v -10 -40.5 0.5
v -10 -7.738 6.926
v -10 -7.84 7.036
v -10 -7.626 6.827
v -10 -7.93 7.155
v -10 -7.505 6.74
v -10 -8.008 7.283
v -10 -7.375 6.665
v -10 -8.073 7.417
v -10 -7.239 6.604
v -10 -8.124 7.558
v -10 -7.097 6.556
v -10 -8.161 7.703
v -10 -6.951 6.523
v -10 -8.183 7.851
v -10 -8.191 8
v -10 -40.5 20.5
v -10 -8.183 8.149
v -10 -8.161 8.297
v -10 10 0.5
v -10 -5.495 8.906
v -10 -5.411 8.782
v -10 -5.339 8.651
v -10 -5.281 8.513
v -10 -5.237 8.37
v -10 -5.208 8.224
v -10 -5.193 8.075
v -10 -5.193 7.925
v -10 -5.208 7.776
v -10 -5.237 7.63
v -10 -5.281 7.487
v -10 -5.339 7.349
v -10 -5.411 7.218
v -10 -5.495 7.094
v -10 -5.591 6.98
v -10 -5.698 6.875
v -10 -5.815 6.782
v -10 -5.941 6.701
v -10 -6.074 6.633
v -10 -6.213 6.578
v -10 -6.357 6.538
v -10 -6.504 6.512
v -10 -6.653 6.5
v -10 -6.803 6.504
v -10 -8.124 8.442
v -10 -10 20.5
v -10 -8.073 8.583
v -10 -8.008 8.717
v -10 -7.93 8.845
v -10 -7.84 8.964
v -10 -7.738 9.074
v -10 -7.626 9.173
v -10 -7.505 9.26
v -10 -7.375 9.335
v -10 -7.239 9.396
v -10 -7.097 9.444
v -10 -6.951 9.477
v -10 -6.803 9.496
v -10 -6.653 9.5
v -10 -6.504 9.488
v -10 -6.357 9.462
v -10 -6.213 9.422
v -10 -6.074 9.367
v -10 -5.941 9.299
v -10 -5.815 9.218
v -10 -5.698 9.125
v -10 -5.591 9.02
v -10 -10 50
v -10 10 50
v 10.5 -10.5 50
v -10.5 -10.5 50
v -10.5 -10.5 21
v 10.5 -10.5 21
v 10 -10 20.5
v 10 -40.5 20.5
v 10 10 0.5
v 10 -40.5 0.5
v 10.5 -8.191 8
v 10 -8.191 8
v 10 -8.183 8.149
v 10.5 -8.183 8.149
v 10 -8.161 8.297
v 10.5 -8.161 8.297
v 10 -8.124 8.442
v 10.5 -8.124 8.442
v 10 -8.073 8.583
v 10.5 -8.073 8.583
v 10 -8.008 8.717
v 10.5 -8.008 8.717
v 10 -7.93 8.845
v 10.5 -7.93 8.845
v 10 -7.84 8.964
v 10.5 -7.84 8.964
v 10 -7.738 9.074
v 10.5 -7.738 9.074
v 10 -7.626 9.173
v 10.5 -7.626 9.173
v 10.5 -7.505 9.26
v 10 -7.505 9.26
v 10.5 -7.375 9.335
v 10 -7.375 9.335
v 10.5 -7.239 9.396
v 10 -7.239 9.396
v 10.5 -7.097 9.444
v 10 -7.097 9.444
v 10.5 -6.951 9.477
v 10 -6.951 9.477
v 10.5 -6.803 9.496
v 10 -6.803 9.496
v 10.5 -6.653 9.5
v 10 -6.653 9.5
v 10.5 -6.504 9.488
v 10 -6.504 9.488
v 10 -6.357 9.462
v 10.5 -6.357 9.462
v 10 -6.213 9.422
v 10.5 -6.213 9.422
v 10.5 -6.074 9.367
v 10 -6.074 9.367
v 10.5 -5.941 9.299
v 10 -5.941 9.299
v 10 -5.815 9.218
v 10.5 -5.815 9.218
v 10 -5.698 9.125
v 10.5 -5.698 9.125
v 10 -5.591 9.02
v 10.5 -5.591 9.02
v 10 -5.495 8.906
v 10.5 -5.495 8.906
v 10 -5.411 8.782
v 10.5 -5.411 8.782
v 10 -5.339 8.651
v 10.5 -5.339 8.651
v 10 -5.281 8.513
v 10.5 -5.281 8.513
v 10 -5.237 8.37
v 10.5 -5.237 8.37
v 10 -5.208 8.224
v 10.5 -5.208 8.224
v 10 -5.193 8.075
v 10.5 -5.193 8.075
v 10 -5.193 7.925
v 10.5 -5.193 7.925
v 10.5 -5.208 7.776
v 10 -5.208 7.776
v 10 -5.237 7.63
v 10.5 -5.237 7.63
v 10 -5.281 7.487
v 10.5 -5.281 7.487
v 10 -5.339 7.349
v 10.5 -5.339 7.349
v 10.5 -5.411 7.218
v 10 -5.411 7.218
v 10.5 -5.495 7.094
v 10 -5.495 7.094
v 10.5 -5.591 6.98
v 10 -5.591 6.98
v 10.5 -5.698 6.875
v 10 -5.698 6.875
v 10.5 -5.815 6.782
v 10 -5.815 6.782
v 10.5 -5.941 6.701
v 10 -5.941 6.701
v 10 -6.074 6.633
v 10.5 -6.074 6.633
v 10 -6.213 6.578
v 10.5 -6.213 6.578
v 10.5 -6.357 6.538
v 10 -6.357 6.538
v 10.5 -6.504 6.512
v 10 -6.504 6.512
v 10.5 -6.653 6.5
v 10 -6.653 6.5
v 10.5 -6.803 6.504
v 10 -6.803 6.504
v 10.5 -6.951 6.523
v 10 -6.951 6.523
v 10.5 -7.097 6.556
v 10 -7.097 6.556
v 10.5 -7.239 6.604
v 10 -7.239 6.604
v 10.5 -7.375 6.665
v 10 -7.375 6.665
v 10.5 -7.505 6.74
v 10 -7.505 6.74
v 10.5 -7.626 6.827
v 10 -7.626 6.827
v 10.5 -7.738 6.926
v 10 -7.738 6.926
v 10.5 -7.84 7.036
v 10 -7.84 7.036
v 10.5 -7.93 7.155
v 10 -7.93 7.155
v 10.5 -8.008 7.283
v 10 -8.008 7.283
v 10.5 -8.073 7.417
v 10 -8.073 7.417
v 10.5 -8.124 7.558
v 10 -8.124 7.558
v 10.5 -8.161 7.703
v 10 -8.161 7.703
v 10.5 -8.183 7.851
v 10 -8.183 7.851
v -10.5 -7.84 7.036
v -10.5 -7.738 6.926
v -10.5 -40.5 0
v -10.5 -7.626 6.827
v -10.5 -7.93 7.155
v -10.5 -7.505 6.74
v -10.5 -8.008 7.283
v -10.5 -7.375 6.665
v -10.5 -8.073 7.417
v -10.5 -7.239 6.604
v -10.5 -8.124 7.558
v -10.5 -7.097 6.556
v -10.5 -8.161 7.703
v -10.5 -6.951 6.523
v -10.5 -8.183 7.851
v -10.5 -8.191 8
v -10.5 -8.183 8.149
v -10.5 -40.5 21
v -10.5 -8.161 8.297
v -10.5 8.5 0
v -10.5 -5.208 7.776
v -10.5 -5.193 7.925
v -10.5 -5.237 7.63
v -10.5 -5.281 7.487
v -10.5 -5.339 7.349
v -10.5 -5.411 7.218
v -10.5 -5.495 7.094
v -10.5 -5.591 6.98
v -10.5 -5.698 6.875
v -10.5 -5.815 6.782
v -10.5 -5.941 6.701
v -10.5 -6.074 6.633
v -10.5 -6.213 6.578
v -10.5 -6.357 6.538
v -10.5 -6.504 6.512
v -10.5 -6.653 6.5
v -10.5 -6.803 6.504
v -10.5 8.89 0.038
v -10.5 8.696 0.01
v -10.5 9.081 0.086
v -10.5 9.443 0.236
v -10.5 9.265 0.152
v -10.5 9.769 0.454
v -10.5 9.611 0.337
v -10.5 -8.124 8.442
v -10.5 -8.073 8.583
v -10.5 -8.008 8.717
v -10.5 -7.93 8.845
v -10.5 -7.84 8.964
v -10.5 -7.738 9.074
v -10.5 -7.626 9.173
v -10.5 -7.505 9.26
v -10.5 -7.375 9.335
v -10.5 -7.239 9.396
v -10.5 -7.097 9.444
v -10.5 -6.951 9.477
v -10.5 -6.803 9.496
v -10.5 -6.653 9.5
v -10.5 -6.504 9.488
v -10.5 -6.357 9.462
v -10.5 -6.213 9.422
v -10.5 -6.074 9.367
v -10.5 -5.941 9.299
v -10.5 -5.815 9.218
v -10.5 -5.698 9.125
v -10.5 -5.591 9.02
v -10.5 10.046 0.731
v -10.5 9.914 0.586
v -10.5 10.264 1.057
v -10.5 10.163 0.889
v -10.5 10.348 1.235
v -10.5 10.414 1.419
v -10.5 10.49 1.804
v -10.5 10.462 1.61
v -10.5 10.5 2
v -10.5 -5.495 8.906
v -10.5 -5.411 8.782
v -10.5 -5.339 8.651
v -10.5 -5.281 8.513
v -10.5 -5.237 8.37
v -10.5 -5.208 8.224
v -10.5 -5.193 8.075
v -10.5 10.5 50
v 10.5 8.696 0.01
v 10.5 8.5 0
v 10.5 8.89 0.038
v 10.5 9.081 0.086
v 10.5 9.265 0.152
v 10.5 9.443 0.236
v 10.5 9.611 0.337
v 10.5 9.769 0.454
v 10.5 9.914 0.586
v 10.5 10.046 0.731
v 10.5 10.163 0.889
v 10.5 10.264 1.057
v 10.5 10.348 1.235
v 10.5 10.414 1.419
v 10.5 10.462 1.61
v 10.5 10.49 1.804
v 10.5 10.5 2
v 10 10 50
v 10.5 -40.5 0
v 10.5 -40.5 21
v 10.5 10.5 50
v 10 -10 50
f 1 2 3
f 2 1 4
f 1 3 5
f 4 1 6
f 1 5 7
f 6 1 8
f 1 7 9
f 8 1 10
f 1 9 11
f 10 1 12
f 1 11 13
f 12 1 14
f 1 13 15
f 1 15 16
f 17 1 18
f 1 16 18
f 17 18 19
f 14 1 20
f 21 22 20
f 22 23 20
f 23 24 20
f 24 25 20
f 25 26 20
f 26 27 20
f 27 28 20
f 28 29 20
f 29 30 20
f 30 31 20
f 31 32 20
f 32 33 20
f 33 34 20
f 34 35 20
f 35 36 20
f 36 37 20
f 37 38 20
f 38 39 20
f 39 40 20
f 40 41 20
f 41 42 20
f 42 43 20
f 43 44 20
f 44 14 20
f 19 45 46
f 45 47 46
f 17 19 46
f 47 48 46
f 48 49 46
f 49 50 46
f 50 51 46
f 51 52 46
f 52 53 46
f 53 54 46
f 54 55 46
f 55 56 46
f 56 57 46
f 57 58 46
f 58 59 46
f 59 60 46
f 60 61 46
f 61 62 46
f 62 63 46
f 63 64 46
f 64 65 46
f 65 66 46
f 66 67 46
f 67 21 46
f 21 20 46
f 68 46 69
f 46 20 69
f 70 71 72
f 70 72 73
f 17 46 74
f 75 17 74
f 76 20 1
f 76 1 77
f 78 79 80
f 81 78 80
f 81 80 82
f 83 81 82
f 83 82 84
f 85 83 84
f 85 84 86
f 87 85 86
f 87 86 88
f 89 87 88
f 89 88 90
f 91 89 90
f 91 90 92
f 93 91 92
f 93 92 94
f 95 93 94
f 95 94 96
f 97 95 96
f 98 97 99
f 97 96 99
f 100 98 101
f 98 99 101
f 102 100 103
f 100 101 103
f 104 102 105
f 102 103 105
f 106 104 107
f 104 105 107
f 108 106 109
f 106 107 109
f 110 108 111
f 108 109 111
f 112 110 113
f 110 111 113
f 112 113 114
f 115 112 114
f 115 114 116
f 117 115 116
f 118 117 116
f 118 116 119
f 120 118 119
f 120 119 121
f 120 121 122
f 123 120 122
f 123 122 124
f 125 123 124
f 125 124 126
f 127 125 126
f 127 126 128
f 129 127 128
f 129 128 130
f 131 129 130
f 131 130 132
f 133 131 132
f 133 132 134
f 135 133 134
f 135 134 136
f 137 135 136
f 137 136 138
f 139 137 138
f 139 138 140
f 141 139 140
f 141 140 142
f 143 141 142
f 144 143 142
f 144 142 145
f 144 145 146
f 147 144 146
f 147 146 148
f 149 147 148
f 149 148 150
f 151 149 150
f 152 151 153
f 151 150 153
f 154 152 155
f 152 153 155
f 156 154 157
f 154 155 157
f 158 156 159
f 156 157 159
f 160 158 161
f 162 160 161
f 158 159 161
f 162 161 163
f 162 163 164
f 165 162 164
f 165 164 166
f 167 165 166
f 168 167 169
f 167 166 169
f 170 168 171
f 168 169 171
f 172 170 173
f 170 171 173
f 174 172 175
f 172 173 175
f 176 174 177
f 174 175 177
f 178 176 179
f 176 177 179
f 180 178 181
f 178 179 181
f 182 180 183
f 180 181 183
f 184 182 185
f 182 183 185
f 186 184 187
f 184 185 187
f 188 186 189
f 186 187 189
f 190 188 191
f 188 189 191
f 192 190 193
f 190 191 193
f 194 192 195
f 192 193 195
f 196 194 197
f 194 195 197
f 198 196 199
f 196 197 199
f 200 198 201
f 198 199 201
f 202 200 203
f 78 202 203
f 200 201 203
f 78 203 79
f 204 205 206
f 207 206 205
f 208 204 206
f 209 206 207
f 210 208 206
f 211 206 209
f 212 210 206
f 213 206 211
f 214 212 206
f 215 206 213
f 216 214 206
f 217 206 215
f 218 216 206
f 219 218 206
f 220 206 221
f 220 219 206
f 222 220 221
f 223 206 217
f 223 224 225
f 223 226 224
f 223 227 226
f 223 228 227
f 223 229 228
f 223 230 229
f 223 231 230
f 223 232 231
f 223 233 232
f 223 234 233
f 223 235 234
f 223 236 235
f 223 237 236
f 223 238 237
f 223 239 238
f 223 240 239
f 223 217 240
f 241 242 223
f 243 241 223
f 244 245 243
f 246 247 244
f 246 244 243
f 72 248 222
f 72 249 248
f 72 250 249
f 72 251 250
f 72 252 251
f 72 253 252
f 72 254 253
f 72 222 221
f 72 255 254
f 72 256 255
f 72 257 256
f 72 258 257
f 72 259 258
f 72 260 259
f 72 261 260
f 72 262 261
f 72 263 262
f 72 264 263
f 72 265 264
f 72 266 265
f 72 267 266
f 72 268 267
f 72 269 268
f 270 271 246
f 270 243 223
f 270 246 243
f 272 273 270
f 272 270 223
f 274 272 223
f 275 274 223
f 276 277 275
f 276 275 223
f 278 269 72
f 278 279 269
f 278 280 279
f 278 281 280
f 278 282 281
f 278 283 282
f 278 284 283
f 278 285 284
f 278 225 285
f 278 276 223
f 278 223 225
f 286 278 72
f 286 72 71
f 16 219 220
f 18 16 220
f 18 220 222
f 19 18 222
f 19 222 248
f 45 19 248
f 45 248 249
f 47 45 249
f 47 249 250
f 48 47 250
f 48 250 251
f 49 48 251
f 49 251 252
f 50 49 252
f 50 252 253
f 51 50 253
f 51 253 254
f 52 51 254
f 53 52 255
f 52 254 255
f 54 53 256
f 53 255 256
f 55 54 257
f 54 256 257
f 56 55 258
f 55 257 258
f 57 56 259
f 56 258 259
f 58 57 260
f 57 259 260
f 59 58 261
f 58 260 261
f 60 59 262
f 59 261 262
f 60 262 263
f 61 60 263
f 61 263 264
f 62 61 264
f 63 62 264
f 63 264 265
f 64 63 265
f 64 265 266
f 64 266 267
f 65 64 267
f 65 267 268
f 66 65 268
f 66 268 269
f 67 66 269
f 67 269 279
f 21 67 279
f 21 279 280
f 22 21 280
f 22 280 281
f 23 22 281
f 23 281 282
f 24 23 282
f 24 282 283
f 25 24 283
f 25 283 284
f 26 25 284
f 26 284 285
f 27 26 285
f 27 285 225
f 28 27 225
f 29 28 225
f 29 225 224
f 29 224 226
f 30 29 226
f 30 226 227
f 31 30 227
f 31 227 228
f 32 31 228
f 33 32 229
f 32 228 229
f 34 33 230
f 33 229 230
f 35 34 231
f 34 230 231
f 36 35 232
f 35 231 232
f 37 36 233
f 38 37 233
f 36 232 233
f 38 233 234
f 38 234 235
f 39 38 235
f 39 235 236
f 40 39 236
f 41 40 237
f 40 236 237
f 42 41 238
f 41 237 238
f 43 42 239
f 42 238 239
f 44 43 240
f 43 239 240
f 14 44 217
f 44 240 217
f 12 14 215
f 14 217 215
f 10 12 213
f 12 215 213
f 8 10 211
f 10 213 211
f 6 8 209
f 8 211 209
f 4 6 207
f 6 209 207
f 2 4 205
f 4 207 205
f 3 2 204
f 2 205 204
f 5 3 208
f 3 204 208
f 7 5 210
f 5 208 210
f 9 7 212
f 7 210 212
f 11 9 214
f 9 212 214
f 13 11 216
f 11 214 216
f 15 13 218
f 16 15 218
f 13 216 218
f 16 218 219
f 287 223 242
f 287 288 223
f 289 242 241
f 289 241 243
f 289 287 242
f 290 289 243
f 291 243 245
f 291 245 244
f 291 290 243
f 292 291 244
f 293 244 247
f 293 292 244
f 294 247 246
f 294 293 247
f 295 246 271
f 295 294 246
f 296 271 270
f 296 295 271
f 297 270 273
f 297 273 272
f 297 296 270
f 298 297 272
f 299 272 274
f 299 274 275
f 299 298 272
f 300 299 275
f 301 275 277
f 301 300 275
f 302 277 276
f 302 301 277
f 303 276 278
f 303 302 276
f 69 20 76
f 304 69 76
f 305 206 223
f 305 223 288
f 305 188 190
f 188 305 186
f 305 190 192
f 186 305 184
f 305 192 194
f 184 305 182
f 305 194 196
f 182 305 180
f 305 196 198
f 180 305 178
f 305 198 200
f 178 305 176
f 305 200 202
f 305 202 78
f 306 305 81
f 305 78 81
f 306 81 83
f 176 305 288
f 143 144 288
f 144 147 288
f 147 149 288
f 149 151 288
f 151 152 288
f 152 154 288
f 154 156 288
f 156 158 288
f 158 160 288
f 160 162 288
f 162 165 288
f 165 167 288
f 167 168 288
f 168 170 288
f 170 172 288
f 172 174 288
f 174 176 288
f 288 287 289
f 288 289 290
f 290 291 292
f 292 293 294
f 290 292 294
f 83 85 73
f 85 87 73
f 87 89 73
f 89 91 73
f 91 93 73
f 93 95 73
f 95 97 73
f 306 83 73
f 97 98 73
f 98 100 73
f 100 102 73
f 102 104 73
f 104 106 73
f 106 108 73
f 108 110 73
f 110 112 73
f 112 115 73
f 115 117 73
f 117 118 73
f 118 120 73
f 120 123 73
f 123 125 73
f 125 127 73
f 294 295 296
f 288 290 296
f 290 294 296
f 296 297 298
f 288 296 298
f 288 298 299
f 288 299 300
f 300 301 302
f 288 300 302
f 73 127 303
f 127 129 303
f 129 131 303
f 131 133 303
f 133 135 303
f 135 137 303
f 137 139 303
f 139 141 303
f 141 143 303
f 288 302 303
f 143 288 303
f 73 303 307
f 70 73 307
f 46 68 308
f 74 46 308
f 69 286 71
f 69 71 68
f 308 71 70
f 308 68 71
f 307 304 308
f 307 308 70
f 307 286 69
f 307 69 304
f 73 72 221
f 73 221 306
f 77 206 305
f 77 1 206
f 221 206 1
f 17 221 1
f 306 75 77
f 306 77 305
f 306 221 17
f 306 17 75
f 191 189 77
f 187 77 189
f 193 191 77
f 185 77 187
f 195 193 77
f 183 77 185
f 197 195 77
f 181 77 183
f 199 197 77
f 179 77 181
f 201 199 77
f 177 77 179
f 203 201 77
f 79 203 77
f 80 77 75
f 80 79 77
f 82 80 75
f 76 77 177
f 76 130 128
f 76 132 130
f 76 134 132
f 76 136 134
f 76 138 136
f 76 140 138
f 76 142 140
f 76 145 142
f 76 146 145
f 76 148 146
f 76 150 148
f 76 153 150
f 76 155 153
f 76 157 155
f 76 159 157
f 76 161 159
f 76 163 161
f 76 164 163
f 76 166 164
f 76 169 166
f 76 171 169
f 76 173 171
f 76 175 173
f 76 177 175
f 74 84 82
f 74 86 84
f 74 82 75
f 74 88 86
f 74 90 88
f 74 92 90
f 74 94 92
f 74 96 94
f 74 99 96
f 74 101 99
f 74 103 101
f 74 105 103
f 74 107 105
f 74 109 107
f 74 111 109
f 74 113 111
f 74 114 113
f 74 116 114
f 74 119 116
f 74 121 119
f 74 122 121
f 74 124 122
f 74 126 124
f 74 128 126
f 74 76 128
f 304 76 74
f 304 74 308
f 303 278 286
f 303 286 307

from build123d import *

# Parameters (mm, degrees)
ESQUISSE1_W             = 21
ESQUISSE1_H             = 21
BOSS_EXTRU_1_DEPTH      = 50
ESQUISSE3_W             = 21
ESQUISSE3_H             = 21
BOSS_EXTRU_2_DEPTH      = 30
COQUE1_T                = -0.5
CONG_1_R                = 2
ESQUISSE4_R             = 1.5
ENL_V_MAT_EXTRU_1_DEPTH = 68.684931853


with BuildPart() as part:
    # Esquisse1 → Boss.-Extru.1 (new body)
    with BuildSketch(Plane.XY):
        Rectangle(ESQUISSE1_W, ESQUISSE1_H)
    extrude(amount=BOSS_EXTRU_1_DEPTH)

    # Esquisse3 → Boss.-Extru.2 (add)
    with BuildSketch(Plane.XZ.offset(10.5)):
        with Locations((0, 10.5)):
            Rectangle(ESQUISSE3_W, ESQUISSE3_H)
    extrude(amount=BOSS_EXTRU_2_DEPTH)

    # Coque1
    coque1_openings = [part.faces().sort_by_distance(p)[0] for p in [
        (0, 0, 50),
        (0, -40.5, 10.5),
    ]]
    offset(amount=COQUE1_T, openings=coque1_openings, kind=Kind.INTERSECTION)

    # Congé1
    cong_1_edges = [part.edges().sort_by_distance(p)[0] for p in [
        (0, 10.5, 0),
    ]]
    fillet(cong_1_edges, radius=CONG_1_R)

    # Esquisse4 → Enlèv. mat.-Extru.1 (cut, through all)
    with BuildSketch(Plane.ZY.offset(10.5)):
        with Locations(Location((8, -6.690777593, 0), (0, 0, 270))):
            Circle(ESQUISSE4_R)
    extrude(amount=-ENL_V_MAT_EXTRU_1_DEPTH, mode=Mode.SUBTRACT)


solid = part.part
